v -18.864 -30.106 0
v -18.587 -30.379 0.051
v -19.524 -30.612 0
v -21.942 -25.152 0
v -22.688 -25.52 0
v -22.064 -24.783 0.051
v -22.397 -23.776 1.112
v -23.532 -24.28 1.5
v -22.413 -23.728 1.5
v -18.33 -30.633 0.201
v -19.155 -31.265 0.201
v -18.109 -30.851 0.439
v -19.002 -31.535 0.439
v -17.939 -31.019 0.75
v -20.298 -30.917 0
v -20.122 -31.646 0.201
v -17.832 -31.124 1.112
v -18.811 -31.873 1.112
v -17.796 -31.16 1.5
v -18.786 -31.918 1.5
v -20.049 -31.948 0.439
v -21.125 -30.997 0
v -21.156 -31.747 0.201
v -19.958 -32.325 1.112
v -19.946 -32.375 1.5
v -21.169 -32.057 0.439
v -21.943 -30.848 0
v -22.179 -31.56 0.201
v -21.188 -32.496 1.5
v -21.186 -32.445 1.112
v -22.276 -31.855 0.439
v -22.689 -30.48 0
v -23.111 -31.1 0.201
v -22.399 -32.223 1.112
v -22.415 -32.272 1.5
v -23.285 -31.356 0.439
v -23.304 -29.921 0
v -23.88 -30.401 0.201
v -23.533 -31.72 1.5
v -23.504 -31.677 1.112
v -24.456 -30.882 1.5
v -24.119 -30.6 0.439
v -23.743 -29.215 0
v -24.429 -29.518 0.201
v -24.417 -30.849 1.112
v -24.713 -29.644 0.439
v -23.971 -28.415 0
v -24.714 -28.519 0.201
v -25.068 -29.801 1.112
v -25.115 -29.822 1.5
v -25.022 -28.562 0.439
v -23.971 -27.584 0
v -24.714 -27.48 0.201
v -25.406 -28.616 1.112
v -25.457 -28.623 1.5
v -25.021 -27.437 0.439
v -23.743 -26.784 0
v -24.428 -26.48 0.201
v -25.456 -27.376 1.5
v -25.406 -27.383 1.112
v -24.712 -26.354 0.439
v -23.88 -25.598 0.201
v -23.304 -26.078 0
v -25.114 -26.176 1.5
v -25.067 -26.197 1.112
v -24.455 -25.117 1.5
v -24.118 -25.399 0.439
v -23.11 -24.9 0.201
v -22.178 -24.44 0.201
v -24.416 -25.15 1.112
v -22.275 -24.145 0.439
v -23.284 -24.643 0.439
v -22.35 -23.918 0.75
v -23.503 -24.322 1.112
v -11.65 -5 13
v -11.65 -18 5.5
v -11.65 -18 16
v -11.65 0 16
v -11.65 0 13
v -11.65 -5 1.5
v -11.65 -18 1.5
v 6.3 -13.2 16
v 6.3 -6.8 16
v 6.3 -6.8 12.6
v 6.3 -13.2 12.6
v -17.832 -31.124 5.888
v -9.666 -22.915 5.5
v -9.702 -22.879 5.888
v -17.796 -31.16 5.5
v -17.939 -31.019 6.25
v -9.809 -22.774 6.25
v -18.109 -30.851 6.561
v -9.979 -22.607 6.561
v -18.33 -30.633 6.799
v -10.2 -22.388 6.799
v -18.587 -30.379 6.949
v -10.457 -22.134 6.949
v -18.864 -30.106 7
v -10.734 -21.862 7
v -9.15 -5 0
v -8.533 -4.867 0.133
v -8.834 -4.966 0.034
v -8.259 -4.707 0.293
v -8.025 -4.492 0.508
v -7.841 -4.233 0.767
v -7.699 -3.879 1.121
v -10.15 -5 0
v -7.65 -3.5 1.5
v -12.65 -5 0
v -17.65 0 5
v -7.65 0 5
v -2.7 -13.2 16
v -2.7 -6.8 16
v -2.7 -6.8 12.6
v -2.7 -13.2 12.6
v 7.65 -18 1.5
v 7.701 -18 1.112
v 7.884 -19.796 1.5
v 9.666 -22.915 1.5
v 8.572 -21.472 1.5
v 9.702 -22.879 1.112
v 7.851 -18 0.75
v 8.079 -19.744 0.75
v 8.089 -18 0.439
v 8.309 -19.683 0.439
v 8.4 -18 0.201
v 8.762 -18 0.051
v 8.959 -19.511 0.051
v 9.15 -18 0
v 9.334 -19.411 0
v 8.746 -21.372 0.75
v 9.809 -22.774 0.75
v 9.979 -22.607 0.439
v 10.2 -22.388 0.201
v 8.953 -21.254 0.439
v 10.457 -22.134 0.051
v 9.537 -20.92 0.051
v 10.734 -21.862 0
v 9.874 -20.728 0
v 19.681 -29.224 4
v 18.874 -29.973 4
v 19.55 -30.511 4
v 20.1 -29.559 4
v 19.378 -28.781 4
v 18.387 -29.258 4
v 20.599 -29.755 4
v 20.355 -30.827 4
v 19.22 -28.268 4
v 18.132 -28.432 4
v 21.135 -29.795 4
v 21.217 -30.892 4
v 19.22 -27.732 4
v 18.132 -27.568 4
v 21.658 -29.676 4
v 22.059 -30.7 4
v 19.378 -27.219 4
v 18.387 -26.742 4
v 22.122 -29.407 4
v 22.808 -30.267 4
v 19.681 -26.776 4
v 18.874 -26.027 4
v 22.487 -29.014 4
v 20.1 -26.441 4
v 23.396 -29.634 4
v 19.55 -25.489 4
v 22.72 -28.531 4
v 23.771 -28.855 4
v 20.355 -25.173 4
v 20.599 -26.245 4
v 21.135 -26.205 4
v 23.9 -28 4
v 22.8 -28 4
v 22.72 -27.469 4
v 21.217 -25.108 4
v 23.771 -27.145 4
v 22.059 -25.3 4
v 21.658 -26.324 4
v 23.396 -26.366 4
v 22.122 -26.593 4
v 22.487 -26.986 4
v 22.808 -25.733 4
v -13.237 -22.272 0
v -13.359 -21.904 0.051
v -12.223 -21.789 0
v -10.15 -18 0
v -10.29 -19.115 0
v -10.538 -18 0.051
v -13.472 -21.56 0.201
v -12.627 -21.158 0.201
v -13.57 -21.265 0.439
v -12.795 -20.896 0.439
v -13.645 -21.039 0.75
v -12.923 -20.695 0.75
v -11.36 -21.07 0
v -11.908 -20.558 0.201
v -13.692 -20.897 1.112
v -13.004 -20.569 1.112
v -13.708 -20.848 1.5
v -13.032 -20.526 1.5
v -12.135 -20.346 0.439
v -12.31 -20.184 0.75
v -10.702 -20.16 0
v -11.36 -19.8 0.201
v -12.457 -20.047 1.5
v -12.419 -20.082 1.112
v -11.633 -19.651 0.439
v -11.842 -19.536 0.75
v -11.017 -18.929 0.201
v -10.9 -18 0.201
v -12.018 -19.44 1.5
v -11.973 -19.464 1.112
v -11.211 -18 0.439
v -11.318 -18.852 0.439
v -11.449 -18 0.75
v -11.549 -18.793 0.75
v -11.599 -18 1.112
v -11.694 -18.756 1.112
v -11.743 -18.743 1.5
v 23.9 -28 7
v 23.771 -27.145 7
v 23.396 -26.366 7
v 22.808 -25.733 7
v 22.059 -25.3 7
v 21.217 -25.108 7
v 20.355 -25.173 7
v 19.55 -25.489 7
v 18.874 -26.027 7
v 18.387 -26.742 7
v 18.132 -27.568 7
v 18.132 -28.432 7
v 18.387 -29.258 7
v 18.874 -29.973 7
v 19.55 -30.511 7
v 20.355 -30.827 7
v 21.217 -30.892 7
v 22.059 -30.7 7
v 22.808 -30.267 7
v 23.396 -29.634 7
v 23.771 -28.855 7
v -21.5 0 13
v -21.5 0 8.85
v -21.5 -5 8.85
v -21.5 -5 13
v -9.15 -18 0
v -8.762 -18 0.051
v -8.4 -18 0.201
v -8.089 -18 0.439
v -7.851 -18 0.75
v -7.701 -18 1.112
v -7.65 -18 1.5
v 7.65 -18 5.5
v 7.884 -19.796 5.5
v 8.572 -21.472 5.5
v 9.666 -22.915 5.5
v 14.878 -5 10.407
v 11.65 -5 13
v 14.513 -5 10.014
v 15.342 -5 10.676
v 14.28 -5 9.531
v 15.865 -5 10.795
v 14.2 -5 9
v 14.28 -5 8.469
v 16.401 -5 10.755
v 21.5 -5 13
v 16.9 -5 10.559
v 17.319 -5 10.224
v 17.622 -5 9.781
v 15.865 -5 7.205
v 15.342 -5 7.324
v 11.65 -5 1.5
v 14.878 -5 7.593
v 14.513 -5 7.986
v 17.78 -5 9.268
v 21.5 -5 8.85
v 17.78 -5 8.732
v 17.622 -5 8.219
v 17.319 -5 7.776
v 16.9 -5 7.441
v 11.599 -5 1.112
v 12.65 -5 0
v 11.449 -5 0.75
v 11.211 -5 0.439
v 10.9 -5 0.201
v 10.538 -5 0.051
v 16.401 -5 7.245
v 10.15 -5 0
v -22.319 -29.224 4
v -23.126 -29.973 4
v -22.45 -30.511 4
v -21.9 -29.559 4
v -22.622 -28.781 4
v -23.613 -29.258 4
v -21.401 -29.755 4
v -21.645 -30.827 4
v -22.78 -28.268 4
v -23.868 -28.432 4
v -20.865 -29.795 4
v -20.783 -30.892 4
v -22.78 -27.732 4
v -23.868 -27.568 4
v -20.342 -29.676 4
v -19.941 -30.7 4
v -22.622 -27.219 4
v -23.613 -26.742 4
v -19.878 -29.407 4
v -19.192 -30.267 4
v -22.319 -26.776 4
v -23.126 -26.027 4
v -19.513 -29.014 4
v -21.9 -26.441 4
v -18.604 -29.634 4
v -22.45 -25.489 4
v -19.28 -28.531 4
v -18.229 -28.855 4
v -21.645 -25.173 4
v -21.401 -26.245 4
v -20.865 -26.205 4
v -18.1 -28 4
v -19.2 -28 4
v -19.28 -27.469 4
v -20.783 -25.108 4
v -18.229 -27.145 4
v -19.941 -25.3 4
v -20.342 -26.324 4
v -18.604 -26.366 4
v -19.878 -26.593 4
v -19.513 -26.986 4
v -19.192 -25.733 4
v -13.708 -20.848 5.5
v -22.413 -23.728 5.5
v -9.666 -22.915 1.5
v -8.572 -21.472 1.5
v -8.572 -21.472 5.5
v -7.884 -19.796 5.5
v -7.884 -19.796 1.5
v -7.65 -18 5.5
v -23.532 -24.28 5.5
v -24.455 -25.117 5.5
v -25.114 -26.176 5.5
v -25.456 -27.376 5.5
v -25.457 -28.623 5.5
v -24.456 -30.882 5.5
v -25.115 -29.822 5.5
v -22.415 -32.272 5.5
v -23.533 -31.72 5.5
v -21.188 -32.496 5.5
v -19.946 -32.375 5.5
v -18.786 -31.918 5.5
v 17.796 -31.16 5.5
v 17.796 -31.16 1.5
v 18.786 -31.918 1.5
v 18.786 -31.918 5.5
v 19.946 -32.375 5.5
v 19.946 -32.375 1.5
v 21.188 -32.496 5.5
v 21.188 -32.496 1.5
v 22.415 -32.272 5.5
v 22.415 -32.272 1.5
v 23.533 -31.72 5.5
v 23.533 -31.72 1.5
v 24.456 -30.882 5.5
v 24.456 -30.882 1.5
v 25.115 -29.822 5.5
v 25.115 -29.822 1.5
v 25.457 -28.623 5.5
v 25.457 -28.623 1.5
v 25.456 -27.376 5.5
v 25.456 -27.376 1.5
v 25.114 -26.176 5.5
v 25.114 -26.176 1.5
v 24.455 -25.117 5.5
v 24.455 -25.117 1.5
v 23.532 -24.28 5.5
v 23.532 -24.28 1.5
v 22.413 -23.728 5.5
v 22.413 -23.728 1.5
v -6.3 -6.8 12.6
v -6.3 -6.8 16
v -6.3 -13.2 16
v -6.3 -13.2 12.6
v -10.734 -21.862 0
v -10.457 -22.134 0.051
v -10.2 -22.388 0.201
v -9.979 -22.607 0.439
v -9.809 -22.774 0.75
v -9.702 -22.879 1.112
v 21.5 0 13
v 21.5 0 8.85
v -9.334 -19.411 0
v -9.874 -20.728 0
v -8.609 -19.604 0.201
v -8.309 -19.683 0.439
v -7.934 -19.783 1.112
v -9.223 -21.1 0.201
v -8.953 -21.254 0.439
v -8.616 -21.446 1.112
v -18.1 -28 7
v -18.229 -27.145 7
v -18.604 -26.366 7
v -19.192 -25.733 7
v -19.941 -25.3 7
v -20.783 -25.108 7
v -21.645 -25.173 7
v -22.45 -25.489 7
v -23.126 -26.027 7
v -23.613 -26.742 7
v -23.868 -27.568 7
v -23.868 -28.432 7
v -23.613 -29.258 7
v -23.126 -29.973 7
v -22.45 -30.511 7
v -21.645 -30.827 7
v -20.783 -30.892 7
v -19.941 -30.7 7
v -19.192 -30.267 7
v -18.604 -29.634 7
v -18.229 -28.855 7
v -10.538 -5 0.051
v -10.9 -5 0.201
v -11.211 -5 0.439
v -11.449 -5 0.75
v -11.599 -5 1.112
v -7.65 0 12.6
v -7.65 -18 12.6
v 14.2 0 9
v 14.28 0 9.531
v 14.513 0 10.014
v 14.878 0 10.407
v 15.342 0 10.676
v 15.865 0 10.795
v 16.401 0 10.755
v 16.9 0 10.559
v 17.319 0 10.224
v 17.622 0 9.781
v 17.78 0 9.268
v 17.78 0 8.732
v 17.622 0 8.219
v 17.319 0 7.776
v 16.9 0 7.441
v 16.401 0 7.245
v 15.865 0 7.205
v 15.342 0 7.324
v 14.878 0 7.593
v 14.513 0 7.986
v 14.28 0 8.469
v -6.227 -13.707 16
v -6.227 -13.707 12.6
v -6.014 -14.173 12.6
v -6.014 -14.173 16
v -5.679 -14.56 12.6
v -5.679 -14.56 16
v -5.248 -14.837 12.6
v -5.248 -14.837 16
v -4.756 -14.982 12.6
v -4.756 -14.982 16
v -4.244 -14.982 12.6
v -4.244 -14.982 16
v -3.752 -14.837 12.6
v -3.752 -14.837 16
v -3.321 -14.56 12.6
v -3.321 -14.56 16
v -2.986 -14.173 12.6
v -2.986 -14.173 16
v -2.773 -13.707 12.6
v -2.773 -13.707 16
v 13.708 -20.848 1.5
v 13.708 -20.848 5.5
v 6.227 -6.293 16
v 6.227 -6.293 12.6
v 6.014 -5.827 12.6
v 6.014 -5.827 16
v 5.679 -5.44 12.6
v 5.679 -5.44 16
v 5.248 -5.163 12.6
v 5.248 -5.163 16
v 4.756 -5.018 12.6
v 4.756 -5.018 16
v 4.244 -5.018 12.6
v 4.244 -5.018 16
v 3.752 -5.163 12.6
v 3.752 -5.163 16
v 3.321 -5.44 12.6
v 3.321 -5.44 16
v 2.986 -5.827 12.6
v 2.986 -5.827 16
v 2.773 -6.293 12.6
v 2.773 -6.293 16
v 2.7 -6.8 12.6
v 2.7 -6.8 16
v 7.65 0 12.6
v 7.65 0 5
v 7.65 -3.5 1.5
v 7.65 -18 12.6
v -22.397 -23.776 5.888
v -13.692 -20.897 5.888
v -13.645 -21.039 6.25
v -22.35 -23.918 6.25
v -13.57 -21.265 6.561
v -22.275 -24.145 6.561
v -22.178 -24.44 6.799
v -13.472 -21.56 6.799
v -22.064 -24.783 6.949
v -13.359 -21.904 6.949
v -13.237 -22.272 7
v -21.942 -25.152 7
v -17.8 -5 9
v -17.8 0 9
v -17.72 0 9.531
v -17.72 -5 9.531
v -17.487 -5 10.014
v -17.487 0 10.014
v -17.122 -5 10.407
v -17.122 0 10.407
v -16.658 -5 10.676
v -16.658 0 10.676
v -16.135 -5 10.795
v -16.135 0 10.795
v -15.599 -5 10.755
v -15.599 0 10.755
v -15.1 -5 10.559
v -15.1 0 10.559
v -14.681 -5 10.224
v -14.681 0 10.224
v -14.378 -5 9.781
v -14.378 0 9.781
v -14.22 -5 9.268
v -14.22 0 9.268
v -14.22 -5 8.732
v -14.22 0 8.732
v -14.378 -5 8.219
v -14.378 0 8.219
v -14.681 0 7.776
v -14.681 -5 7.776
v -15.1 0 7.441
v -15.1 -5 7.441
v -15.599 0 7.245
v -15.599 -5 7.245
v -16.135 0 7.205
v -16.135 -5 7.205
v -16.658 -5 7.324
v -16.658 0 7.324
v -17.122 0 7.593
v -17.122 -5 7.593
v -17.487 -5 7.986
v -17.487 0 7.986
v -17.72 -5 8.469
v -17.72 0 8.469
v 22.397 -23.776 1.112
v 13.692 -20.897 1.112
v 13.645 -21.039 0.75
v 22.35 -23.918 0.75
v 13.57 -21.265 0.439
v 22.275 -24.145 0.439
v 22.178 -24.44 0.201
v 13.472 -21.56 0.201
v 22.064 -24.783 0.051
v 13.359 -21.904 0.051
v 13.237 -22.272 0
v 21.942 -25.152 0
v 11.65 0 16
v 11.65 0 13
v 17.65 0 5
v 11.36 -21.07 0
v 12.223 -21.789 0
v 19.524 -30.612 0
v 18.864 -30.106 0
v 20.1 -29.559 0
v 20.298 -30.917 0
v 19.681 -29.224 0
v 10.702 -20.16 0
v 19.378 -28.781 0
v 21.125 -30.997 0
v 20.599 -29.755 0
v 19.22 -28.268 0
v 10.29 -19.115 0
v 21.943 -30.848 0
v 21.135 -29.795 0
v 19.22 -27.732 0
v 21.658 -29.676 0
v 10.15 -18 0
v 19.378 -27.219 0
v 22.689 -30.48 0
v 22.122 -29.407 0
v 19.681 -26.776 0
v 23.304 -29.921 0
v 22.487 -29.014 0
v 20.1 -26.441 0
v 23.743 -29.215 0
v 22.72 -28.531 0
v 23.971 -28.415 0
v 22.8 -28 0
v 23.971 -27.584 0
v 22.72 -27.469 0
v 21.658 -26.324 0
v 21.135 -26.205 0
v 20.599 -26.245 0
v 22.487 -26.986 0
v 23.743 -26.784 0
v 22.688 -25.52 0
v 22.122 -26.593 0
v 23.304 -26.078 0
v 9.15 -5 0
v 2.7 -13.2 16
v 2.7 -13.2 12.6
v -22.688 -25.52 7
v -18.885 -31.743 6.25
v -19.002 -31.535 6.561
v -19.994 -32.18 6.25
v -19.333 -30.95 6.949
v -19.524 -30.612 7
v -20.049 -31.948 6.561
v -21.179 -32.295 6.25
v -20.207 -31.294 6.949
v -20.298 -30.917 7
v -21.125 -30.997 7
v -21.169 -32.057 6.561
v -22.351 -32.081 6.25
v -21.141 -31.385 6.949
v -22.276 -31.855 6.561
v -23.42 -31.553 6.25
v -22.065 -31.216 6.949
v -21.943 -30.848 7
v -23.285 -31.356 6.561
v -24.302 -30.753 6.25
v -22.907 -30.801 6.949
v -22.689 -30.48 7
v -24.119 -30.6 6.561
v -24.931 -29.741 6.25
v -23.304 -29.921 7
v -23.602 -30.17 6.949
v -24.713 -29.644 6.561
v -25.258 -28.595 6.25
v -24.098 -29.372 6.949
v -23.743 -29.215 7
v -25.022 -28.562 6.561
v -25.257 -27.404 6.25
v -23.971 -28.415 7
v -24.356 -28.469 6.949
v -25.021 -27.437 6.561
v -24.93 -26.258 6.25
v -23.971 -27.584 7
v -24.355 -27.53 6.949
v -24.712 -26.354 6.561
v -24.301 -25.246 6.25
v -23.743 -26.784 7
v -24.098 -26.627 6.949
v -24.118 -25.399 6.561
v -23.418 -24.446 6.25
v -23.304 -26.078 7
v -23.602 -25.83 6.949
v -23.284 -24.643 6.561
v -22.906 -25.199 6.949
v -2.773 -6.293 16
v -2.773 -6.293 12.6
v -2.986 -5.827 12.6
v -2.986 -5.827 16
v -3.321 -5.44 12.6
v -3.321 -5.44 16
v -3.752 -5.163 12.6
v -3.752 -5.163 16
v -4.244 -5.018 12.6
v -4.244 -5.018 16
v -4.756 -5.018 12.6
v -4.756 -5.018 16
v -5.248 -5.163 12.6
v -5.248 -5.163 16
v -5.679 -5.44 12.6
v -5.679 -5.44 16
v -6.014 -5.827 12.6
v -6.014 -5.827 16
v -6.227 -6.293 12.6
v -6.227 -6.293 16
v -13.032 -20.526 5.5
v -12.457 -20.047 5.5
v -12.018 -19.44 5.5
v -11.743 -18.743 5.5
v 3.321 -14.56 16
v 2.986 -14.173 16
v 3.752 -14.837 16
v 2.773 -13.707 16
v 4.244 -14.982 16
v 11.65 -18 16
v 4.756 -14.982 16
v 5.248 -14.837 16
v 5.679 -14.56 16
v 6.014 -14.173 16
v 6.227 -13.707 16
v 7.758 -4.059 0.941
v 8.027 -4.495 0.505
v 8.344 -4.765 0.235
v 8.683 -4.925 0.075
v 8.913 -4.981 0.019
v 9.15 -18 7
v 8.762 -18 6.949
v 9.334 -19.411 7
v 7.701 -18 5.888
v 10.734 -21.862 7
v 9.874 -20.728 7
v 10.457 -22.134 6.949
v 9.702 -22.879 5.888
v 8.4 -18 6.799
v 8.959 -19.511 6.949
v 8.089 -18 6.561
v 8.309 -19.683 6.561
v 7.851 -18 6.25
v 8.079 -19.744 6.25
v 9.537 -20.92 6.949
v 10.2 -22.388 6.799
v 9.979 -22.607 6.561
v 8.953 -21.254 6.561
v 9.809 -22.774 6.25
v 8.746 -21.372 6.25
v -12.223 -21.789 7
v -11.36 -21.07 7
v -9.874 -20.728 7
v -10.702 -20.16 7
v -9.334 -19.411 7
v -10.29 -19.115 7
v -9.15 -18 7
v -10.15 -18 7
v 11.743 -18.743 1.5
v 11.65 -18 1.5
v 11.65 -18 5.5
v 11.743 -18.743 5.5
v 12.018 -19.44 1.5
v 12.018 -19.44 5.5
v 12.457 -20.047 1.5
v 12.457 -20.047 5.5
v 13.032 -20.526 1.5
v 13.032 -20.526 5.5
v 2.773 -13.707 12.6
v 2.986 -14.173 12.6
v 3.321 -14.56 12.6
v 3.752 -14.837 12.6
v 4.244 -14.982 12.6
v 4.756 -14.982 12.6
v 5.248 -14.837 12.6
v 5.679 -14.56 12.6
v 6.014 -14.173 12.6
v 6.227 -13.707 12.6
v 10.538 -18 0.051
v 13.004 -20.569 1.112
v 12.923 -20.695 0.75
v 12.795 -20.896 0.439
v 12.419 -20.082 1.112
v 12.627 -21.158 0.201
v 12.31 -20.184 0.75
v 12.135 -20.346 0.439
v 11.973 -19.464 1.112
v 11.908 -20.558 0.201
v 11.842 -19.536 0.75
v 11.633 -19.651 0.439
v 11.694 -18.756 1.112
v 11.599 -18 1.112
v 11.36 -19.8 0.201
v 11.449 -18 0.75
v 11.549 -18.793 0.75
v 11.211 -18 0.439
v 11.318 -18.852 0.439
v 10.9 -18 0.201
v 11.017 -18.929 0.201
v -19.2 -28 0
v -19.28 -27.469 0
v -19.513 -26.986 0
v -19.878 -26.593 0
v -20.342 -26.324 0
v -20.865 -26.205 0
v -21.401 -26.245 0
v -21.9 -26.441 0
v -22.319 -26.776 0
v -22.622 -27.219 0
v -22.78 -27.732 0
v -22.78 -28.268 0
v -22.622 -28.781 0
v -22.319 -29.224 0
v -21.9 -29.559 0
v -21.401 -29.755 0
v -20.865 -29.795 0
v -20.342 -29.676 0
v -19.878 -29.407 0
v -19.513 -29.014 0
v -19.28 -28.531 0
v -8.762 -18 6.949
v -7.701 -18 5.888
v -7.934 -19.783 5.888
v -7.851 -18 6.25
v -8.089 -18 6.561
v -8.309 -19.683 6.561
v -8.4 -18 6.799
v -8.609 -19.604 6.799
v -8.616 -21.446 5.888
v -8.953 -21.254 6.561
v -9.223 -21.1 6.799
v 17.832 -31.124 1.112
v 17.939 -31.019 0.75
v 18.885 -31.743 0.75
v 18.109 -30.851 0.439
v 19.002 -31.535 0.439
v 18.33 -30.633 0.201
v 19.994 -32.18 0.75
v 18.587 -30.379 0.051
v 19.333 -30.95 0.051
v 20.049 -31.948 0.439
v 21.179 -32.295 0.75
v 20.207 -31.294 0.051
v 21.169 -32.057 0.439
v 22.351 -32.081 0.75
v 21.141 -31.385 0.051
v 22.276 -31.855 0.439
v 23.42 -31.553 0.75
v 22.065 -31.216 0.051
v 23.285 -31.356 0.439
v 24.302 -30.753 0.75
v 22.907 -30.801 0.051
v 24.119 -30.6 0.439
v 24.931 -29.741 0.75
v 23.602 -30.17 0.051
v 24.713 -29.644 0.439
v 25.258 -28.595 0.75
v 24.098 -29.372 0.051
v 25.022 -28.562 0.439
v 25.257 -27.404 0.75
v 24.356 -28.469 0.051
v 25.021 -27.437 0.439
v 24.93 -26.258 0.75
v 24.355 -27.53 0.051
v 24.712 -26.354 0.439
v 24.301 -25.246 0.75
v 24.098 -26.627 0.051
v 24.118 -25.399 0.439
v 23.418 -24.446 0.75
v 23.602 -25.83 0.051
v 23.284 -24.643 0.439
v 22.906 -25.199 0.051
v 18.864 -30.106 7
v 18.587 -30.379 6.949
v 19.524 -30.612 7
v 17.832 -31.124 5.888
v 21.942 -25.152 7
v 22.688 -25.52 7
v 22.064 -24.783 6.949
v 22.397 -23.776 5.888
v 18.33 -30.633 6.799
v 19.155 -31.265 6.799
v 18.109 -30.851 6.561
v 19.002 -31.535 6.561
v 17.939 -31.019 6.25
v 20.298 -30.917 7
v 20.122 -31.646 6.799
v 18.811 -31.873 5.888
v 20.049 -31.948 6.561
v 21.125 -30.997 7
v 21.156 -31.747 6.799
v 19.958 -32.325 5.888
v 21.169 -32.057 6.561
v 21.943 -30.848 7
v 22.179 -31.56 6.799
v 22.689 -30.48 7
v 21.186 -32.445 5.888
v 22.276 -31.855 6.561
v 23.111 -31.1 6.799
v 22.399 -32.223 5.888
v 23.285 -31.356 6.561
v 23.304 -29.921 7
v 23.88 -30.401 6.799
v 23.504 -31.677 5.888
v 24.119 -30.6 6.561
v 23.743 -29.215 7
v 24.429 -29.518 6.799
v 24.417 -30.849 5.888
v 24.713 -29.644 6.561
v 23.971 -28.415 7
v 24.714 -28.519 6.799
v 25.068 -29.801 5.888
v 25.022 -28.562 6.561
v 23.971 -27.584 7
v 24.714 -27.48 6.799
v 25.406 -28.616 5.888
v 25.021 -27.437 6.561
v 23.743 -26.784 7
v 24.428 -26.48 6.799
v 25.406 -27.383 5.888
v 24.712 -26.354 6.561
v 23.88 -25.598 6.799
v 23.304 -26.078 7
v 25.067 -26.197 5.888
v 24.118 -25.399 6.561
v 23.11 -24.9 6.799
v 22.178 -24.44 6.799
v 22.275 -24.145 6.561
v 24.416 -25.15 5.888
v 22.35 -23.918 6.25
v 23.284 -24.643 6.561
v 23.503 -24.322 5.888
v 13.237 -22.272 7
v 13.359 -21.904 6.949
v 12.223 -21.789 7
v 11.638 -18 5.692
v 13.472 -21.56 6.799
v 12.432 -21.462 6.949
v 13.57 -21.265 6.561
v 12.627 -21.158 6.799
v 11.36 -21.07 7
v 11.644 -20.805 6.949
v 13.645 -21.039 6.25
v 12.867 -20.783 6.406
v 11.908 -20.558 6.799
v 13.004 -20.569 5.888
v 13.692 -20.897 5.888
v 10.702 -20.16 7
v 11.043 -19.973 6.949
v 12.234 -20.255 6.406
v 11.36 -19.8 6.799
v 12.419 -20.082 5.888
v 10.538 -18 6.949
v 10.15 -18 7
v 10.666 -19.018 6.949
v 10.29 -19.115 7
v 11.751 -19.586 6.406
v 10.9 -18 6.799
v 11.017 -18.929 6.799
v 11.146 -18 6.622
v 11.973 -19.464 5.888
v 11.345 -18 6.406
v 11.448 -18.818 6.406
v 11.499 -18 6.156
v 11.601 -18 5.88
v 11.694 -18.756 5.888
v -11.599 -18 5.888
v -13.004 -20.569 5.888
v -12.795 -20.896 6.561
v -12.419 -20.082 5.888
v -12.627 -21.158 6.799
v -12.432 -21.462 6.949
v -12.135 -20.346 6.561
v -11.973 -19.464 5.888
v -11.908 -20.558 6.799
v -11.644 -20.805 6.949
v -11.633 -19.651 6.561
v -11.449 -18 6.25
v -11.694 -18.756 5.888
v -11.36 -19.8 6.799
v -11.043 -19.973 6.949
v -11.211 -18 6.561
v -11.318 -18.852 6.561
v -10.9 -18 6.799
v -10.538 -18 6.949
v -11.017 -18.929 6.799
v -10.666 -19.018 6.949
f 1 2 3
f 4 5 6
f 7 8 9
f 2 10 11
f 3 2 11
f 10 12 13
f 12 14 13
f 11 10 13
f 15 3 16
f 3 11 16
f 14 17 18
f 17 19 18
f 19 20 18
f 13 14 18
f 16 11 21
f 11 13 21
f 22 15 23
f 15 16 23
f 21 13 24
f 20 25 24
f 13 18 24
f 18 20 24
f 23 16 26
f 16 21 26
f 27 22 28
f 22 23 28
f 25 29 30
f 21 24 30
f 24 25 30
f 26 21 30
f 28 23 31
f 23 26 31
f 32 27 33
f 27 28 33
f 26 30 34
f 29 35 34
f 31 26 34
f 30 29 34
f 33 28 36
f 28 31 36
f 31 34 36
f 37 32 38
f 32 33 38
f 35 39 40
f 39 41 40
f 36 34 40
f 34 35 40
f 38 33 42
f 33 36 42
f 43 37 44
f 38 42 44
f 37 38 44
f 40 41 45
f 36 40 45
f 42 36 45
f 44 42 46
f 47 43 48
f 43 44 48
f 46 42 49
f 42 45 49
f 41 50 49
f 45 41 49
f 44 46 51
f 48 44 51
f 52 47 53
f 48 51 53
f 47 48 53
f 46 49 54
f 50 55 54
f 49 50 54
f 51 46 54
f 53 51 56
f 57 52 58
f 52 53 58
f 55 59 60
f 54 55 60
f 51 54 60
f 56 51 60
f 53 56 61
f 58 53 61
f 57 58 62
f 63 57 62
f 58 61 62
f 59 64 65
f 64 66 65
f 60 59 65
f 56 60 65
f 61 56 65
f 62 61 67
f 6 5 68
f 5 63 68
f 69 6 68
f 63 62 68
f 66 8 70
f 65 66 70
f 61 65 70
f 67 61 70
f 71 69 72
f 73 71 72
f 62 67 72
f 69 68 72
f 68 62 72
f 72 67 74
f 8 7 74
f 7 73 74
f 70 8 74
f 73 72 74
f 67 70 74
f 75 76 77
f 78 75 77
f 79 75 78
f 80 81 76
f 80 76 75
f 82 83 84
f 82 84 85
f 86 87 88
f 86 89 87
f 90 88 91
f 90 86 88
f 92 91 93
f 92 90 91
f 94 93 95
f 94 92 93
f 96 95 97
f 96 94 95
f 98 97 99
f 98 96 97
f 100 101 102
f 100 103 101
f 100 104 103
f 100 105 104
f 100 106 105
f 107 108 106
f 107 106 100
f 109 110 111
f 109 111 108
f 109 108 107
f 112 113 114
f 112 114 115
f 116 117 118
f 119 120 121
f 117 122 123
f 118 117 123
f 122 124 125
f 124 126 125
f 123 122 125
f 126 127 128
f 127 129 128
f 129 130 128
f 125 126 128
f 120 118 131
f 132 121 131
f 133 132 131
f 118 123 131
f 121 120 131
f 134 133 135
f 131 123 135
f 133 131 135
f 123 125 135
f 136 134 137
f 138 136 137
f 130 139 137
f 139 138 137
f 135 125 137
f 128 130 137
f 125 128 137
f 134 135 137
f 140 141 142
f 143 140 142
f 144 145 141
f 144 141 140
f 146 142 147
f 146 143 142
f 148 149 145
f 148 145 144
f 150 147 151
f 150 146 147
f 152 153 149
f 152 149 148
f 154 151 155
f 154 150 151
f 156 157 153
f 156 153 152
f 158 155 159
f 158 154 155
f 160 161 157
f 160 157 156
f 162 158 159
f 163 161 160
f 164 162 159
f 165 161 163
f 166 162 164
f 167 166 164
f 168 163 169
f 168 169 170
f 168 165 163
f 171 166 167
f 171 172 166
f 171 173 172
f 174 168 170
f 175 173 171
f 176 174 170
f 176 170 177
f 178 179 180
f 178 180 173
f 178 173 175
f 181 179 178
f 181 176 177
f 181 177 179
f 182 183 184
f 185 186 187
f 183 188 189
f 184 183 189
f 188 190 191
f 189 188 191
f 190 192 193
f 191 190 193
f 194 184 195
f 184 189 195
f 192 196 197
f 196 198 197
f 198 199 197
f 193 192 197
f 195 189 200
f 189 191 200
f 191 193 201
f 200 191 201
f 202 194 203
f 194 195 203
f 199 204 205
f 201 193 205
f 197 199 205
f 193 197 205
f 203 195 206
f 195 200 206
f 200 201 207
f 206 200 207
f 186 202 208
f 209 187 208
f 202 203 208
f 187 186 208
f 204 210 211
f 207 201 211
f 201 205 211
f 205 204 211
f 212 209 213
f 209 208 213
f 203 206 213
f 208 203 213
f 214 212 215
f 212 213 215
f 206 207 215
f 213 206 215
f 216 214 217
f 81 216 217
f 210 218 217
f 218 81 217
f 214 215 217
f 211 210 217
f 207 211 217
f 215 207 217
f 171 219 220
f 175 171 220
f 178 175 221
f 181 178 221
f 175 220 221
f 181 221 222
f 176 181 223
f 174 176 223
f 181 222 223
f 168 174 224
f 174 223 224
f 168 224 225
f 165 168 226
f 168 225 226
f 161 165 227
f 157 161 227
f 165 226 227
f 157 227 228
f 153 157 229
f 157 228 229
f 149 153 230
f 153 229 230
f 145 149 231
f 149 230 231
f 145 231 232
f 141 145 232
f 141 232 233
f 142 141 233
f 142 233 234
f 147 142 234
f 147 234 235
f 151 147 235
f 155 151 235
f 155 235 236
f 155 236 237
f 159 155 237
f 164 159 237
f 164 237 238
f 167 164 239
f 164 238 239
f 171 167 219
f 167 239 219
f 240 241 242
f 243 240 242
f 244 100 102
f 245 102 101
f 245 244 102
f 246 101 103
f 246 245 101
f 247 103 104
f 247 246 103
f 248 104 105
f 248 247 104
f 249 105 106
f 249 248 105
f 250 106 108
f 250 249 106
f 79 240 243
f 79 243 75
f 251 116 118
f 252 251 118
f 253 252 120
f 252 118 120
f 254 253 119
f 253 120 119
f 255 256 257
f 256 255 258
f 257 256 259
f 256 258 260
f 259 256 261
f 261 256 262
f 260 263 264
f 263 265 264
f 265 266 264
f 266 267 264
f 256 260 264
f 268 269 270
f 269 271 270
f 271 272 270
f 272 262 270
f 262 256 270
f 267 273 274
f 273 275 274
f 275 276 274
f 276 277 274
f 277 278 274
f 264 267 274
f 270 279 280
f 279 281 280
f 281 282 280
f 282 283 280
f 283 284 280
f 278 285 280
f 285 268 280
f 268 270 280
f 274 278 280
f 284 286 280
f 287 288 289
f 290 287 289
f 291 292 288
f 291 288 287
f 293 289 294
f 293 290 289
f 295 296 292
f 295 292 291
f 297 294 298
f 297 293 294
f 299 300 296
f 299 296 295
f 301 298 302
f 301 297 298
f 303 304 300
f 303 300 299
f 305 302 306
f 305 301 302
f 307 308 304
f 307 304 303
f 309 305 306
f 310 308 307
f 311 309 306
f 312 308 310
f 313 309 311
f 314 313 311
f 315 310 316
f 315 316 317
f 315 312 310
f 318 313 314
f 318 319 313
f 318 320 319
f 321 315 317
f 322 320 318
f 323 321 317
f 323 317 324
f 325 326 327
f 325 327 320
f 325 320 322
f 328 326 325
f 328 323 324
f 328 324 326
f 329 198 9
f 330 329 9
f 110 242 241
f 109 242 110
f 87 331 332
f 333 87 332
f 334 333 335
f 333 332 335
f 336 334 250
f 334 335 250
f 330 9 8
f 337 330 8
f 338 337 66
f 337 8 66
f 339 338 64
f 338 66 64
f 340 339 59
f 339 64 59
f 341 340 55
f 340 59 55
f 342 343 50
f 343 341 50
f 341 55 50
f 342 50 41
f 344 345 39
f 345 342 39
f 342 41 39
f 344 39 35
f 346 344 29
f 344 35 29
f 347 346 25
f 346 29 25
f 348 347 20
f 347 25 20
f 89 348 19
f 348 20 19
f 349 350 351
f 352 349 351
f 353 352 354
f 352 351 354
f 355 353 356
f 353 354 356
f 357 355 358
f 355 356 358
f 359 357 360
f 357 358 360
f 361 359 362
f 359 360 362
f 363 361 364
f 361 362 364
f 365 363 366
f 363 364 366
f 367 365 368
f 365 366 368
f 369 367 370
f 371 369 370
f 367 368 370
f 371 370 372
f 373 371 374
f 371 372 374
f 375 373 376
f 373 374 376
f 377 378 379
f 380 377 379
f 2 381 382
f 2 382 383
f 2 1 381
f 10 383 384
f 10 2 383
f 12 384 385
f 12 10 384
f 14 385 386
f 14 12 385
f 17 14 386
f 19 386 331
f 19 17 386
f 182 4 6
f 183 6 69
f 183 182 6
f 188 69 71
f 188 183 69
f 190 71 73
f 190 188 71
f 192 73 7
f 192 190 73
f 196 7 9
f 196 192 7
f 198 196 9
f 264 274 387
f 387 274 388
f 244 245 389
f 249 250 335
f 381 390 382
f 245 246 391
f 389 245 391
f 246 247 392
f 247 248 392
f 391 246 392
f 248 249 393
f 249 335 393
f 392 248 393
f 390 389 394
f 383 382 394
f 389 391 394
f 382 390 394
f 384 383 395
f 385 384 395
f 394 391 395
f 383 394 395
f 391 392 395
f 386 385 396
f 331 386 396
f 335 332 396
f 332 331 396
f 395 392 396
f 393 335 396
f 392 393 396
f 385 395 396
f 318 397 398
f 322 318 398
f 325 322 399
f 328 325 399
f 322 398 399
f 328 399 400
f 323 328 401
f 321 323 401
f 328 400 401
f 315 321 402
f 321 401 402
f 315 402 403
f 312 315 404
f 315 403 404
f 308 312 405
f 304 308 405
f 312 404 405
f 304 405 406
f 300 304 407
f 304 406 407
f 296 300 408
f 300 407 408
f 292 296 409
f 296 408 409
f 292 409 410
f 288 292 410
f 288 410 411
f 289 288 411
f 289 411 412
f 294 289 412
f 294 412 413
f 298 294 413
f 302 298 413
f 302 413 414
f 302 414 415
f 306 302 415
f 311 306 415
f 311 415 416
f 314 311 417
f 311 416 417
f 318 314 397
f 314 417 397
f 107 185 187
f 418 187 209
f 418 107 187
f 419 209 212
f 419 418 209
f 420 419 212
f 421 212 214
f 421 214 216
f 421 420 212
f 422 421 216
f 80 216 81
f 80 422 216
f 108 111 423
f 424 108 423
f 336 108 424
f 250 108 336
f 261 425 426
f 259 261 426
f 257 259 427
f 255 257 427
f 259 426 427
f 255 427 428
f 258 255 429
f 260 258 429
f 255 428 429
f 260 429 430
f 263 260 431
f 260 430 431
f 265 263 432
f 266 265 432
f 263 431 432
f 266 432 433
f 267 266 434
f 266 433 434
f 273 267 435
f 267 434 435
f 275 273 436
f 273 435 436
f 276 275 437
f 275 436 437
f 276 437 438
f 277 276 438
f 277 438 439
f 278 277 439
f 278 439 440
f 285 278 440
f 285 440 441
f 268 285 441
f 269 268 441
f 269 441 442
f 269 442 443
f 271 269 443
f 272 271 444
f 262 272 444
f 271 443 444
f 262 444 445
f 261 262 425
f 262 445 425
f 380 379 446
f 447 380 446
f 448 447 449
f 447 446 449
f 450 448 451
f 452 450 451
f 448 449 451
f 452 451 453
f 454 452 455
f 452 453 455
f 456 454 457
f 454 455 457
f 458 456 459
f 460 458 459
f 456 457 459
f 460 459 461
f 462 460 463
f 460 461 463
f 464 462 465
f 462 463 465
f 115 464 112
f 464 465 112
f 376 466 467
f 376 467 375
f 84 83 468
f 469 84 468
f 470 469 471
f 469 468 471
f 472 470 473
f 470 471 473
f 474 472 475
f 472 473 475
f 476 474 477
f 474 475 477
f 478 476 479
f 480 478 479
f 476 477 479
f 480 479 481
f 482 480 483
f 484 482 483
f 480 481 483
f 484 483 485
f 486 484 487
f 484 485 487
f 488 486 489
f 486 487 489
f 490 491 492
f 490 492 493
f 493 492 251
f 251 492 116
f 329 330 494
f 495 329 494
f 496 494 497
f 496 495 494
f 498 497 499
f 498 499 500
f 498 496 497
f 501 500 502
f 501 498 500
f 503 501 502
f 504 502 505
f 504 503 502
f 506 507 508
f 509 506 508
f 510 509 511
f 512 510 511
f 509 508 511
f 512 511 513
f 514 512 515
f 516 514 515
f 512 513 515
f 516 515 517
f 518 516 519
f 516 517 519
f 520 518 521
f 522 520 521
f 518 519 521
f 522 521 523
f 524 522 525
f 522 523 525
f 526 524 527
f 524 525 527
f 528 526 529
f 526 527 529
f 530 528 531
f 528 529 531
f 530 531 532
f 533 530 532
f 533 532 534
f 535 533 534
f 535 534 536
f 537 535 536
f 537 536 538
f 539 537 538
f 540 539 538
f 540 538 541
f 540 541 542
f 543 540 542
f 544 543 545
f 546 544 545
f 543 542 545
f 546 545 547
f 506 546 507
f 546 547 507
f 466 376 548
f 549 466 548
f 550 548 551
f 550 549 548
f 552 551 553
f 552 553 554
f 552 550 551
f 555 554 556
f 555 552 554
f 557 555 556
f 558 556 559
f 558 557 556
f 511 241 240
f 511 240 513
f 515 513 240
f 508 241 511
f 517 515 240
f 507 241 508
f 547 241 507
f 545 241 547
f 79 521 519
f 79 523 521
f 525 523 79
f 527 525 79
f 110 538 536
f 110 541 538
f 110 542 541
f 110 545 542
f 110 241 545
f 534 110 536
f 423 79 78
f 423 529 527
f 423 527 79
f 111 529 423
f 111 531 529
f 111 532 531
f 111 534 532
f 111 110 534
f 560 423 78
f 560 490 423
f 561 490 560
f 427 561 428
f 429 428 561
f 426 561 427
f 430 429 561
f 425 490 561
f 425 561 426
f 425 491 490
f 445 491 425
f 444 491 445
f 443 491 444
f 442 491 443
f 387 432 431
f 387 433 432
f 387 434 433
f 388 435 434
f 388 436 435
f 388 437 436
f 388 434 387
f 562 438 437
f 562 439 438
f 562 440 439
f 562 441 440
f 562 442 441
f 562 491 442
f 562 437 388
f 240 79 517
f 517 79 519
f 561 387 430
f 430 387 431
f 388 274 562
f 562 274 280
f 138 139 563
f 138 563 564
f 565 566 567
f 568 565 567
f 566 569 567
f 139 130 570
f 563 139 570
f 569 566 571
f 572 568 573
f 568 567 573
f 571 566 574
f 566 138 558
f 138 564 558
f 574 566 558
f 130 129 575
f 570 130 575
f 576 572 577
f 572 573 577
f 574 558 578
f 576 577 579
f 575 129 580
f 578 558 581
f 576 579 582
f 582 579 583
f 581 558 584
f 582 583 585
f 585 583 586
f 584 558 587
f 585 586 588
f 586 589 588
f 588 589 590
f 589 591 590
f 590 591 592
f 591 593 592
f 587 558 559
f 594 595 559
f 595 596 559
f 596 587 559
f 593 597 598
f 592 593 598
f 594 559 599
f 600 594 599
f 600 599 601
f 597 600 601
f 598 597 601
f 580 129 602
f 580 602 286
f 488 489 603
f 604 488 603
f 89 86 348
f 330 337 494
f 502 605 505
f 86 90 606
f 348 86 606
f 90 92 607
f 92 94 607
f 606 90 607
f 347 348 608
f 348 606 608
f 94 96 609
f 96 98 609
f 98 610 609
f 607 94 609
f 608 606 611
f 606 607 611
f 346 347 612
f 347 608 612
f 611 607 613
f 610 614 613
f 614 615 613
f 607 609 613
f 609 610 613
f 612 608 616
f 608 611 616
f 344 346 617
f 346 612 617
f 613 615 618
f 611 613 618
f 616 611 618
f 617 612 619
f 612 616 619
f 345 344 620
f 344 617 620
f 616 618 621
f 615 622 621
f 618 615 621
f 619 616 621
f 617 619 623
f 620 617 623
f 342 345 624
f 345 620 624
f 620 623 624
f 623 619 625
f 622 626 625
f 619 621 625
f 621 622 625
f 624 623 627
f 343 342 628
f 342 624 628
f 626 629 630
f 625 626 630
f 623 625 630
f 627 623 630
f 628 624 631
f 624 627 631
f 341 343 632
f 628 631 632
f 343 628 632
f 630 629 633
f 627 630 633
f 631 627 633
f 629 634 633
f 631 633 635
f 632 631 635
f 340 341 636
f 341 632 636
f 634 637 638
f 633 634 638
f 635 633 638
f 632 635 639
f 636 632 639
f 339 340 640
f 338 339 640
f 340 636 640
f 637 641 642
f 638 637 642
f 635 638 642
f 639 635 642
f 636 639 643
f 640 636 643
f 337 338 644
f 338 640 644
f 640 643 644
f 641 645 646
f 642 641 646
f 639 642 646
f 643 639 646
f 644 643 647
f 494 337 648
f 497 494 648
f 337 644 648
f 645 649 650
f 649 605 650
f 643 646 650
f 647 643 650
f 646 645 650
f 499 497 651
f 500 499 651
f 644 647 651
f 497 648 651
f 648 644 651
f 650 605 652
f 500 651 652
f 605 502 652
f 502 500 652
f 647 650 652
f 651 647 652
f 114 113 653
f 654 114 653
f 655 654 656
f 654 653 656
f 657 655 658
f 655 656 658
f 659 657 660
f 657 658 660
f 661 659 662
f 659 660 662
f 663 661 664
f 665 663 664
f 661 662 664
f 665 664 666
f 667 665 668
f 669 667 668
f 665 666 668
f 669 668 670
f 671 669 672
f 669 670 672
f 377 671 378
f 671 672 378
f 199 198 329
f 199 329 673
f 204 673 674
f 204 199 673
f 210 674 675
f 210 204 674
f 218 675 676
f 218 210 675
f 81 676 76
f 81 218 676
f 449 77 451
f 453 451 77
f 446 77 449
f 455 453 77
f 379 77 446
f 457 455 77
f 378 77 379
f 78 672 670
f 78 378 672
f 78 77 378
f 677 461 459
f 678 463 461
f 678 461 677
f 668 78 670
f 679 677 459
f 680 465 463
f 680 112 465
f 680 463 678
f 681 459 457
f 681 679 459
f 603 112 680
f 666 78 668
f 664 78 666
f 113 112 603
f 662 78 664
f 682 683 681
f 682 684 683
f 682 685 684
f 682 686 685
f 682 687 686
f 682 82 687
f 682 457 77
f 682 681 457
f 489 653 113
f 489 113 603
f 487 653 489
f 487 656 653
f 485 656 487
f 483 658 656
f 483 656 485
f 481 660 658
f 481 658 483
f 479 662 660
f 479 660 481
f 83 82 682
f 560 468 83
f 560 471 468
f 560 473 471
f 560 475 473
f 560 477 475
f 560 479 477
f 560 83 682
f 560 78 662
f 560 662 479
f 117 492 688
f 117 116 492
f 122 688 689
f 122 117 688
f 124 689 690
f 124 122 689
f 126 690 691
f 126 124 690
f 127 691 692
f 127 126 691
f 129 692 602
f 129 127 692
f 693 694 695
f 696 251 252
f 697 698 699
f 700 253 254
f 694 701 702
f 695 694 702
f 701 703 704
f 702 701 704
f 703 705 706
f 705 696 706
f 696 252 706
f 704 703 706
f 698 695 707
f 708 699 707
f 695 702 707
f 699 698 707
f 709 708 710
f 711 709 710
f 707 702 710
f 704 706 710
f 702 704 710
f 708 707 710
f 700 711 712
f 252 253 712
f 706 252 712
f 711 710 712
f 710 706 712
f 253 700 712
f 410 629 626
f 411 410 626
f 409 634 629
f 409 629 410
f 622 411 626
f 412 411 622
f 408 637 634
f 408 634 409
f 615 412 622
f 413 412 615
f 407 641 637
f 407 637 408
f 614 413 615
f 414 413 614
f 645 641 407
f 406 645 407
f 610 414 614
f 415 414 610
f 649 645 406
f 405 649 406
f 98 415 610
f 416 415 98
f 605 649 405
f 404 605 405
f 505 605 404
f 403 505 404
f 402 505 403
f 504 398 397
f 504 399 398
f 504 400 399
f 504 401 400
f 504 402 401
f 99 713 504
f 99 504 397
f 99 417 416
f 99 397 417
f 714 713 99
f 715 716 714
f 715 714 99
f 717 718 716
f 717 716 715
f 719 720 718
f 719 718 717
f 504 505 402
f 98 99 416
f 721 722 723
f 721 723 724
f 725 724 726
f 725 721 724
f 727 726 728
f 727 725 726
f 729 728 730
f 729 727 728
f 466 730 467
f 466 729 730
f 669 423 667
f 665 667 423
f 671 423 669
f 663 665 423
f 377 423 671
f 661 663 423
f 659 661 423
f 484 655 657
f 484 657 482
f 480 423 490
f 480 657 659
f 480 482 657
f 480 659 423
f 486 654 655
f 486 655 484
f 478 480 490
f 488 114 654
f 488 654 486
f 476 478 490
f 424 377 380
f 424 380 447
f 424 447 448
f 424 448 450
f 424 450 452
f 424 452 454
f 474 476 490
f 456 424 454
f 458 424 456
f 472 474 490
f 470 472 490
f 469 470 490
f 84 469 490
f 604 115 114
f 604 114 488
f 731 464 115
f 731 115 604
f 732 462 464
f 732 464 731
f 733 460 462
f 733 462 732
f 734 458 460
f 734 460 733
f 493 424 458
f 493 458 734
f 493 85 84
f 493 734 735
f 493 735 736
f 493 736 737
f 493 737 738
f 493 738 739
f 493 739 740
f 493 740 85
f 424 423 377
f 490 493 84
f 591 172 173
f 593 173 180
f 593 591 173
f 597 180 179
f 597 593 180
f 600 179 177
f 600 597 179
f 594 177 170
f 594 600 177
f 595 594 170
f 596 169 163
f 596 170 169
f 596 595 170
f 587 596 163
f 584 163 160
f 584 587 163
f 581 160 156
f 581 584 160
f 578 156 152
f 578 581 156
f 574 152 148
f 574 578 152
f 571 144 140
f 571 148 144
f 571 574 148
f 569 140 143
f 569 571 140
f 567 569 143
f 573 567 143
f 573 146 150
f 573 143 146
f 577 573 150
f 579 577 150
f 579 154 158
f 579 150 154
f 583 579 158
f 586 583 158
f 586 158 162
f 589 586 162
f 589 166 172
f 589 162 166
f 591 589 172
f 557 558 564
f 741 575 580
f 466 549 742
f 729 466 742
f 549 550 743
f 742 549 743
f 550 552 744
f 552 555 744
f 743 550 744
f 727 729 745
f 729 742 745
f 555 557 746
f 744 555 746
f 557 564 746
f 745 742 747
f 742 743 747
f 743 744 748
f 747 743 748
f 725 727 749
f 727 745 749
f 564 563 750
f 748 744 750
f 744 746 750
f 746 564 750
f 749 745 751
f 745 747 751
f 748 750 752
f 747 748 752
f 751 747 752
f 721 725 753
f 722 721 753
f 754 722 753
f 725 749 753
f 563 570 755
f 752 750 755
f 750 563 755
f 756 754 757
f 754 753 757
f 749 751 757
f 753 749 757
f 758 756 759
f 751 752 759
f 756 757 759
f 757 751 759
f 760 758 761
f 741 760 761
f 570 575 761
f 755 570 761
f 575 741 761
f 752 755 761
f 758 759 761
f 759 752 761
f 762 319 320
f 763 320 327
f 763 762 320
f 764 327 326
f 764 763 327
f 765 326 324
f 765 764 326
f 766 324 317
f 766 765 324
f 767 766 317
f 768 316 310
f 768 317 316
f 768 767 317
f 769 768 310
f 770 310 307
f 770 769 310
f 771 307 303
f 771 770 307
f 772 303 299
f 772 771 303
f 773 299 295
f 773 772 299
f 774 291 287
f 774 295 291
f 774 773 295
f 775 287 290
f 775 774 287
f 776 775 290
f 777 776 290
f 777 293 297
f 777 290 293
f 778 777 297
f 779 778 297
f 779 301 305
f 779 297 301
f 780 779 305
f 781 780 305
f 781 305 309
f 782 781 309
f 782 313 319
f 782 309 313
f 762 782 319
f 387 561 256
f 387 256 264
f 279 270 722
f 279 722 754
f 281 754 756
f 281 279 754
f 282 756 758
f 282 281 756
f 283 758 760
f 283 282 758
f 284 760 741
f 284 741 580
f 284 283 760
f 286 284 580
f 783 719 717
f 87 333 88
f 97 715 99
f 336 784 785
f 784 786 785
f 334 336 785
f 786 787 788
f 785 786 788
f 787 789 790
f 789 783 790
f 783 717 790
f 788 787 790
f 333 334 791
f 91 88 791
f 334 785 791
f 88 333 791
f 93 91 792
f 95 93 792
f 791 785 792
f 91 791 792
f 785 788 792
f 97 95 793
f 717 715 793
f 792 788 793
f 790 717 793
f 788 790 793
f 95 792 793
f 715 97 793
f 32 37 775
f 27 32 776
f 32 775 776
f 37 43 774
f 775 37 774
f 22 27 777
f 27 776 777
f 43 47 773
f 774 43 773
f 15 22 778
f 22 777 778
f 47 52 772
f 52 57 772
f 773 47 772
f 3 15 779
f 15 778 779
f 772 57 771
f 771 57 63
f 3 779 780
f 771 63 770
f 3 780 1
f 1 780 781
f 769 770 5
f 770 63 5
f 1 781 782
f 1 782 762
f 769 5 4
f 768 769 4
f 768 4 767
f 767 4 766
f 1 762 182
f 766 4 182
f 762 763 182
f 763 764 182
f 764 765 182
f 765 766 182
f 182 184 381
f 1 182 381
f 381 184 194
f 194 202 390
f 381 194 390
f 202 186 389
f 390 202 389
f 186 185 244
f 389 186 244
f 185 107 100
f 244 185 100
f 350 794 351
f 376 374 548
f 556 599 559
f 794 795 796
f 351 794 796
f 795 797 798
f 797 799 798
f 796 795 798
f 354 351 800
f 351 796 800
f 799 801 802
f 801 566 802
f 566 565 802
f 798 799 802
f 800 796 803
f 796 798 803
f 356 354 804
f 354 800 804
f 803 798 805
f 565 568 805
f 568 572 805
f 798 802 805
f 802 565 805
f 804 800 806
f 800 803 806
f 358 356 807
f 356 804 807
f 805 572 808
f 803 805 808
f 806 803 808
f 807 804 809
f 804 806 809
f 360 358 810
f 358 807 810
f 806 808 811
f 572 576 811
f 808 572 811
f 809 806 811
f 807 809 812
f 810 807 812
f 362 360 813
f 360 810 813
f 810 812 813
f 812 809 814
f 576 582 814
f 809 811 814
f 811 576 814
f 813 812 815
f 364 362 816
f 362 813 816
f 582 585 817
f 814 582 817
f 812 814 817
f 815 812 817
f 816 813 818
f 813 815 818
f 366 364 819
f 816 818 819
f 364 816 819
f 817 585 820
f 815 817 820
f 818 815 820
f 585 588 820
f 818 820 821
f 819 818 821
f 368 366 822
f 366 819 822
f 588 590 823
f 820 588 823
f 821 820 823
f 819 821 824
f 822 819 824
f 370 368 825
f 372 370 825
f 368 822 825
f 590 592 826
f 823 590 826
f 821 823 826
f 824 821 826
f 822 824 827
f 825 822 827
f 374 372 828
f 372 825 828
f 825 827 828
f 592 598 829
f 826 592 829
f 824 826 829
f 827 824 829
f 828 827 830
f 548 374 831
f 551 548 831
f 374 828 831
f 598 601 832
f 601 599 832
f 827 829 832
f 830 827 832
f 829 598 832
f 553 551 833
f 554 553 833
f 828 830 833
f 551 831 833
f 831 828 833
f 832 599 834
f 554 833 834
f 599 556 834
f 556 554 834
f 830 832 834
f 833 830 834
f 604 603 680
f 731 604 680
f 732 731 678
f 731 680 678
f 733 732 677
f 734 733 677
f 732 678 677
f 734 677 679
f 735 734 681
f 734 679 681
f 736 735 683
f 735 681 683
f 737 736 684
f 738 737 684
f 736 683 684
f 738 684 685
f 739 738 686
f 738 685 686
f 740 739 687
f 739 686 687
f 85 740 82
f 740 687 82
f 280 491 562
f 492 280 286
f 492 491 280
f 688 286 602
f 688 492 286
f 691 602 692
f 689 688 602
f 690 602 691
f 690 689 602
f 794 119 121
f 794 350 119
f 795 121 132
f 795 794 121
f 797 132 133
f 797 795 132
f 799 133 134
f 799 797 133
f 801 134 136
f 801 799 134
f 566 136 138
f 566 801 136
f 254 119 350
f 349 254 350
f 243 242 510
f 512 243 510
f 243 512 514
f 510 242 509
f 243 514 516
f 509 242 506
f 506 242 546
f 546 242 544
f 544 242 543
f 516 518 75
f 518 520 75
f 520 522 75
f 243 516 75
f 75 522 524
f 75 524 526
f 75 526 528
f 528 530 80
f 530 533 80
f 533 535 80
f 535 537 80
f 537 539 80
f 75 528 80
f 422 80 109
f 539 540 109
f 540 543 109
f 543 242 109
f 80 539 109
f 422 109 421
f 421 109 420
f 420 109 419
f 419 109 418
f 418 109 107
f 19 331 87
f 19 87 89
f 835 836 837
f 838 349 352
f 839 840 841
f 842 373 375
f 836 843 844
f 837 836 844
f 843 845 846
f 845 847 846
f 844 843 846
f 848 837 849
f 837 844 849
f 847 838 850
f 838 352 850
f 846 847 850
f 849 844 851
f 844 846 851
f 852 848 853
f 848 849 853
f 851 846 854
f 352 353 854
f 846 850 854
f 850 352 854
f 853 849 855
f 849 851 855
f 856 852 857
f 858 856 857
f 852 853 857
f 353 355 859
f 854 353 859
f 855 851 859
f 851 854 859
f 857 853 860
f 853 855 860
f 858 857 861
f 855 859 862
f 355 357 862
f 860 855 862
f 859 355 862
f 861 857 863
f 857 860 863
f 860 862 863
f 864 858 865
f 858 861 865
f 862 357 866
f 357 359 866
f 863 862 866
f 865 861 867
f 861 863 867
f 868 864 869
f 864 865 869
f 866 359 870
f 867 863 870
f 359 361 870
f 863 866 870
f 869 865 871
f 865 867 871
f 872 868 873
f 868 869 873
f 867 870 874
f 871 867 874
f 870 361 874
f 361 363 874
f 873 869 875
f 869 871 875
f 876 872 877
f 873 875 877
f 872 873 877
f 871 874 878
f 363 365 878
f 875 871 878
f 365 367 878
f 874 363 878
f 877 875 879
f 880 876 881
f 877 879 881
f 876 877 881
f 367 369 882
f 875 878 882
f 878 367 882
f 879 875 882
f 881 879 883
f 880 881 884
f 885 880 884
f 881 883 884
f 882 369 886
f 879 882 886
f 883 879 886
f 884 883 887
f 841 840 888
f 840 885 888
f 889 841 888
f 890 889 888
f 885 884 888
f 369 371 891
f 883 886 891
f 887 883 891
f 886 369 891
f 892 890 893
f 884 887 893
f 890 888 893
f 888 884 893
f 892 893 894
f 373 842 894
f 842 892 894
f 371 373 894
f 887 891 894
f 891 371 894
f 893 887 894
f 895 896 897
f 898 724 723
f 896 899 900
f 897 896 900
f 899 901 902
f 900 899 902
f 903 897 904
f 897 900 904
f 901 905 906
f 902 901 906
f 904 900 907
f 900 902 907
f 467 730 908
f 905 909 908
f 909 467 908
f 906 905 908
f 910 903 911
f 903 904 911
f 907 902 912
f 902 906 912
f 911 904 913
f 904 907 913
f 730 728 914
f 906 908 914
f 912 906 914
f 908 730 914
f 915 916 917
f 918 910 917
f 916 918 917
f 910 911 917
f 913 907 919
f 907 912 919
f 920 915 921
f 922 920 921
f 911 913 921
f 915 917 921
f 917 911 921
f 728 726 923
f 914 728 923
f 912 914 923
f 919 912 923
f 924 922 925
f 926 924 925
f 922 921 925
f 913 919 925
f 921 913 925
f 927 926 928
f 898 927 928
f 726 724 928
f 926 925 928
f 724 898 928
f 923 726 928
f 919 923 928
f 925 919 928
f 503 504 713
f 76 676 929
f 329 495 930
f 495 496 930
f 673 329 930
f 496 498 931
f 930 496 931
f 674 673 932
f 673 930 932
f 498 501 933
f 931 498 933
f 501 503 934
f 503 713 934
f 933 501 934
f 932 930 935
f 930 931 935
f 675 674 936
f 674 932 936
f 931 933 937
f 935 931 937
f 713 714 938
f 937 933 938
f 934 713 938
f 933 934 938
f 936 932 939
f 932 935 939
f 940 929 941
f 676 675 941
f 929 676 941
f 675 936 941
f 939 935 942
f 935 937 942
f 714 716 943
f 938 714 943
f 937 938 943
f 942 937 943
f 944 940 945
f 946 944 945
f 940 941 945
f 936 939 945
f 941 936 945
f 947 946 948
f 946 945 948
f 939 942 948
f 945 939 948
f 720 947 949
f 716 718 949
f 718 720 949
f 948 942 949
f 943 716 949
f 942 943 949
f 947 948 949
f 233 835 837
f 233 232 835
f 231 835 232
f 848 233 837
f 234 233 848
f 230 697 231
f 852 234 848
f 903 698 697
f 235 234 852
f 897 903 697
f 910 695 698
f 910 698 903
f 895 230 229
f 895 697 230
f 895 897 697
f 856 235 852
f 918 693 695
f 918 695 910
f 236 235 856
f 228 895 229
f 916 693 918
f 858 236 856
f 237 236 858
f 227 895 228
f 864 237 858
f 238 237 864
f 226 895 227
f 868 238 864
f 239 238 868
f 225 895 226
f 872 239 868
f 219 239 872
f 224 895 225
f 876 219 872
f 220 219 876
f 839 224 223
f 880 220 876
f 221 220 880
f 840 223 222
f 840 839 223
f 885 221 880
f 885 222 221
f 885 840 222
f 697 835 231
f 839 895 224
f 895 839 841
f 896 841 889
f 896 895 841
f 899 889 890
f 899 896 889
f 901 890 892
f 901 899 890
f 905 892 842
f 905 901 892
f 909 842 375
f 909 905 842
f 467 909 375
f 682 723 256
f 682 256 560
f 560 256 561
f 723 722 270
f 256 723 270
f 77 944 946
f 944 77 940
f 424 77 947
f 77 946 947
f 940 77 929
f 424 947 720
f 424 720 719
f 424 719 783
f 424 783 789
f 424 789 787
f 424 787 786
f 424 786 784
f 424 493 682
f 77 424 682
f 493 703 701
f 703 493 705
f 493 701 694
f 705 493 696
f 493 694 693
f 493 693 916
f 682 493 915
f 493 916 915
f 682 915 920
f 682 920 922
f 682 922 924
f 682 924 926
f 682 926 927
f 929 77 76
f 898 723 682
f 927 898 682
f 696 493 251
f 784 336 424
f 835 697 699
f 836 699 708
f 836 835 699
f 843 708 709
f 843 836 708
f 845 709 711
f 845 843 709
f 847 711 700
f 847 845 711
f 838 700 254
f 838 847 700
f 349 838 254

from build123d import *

# Parameters (mm, degrees)
SKETCH_R        = 1.8
PAD_DEPTH       = 7
SKETCH001_R     = 2.9
POCKET_DEPTH    = 3
SKETCH002_W     = 9.85
SKETCH002_H     = 5
PAD001_DEPTH    = 6
SKETCH005_R     = 1.8
POCKET002_DEPTH = 5
SKETCH003_W     = 23.3
SKETCH003_H     = 18
PAD002_DEPTH    = 9
SKETCH004_W     = 15.3
SKETCH004_H     = 18
POCKET001_DEPTH = 12.6
POCKET003_DEPTH = 47.001
POCKET004_DEPTH = 5
POCKET005_DEPTH = 16.001
FILLET_R        = 1.5


with BuildPart() as part:
    # Sketch → Pad (new body)
    with BuildSketch(Plane.XY):
        with BuildLine():
            Line((-21.5, 0), (-21.5, -5))
            Line((-21.5, -5), (-11.65, -5))
            Line((-11.65, -5), (-11.65, -18))
            ThreePointArc((-13.707898, -20.848235), (-12.218302, -19.756942), (-11.65, -18))
            Line((-13.707898, -20.848235), (-22.413154, -23.727647))
            ThreePointArc((-22.413154, -23.727647), (-24.822377, -30.374749), (-17.795838, -31.159643))
            Line((-9.665748, -22.915), (-17.795838, -31.159643))
            ThreePointArc((-9.665748, -22.915), (-8.173513, -20.656147), (-7.65, -18))
            Line((-7.65, -18), (7.65, -18))
            ThreePointArc((7.65, -18), (8.173513, -20.656147), (9.665748, -22.915))
            Line((9.665748, -22.915), (17.795838, -31.159643))
            ThreePointArc((17.795838, -31.159643), (24.822377, -30.374749), (22.413154, -23.727647))
            Line((13.707898, -20.848235), (22.413154, -23.727647))
            ThreePointArc((11.65, -18), (12.218302, -19.756942), (13.707898, -20.848235))
            Line((11.65, -5), (11.65, -18))
            Line((21.5, -5), (11.65, -5))
            Line((21.5, -5), (21.5, 0))
            Line((21.5, 0), (-21.5, 0))
        make_face()
        with Locations((-21, -28)):
            Circle(SKETCH_R, mode=Mode.SUBTRACT)
        with Locations((21, -28)):
            Circle(SKETCH_R, mode=Mode.SUBTRACT)
    extrude(amount=PAD_DEPTH)

    # Sketch001 (on Face22 of Pad) → Pocket (cut)
    with BuildSketch(Plane.XY.offset(7)):
        with Locations((-21, -28)):
            Circle(SKETCH001_R)
        with Locations((21, -28)):
            Circle(SKETCH001_R)
    extrude(amount=-POCKET_DEPTH, mode=Mode.SUBTRACT)

    # Sketch002 (on Face5 of Pocket) → Pad001 (join)
    with BuildSketch(Plane.XY.offset(7)):
        with Locations((16.575, -2.5)):
            Rectangle(SKETCH002_W, SKETCH002_H)
        with Locations((-16.575, -2.5)):
            Rectangle(SKETCH002_W, SKETCH002_H)
    extrude(amount=PAD001_DEPTH)

    # Sketch005 (on Face29 of Pad001) → Pocket002 (cut)
    with BuildSketch(Plane(origin=(0, 0, 0), x_dir=(-1, 0, 0), z_dir=(0, 1, 0))):
        with Locations((-16, 9)):
            Circle(SKETCH005_R)
        with Locations((16, 9)):
            Circle(SKETCH005_R)
    extrude(amount=-POCKET002_DEPTH, mode=Mode.SUBTRACT)

    # Sketch003 (on Face3 of Pad001) → Pad002 (join)
    with BuildSketch(Plane.XY.offset(7)):
        with Locations((0, -9)):
            Rectangle(SKETCH003_W, SKETCH003_H)
    extrude(amount=PAD002_DEPTH)

    # Sketch004 (on Face1 of Pad002) → Pocket001 (cut)
    with BuildSketch(Plane(origin=(0, 0, 0), x_dir=(1, 0, 0), z_dir=(0, 0, -1))):
        with Locations((0, 9)):
            Rectangle(SKETCH004_W, SKETCH004_H)
    extrude(amount=-POCKET001_DEPTH, mode=Mode.SUBTRACT)

    # Sketch006 (on Face21 of Pocket001) → Pocket003 (cut, through all)
    with BuildSketch(Plane(origin=(-21.5, 0, 0), x_dir=(0, -1, 0), z_dir=(-1, 0, 0))):
        Polygon((5, 0), (0, 0), (0, 5), align=None)
    extrude(amount=-POCKET003_DEPTH, mode=Mode.SUBTRACT)

    # Sketch007 (on Face1 of Pocket003) → Pocket004 (cut)
    with BuildSketch(Plane.XZ.offset(5)):
        Polygon((-21.5, 0), (-21.5, 8.85), (-12.65, 0), align=None)
        Polygon((21.5, 0), (21.5, 8.85), (12.65, 0), align=None)
    extrude(amount=-POCKET004_DEPTH, mode=Mode.SUBTRACT)

    # Sketch008 (on Face11 of Pocket004) → Pocket005 (cut, through all)
    with BuildSketch(Plane.XY.offset(16)):
        with BuildLine():
            ThreePointArc((-2.7, -6.8), (-4.5, -5), (-6.3, -6.8))
            Line((-6.3, -6.8), (-6.3, -13.2))
            ThreePointArc((-6.3, -13.2), (-4.5, -15), (-2.7, -13.2))
            Line((-2.7, -6.8), (-2.7, -13.2))
        make_face()
        with BuildLine():
            ThreePointArc((6.3, -6.8), (4.5, -5), (2.7, -6.8))
            Line((2.7, -6.8), (2.7, -13.2))
            ThreePointArc((2.7, -13.2), (4.5, -15), (6.3, -13.2))
            Line((6.3, -6.8), (6.3, -13.2))
        make_face()
    extrude(amount=-POCKET005_DEPTH, mode=Mode.SUBTRACT)

    # Fillet
    fillet_edges = [part.edges().sort_by_distance(p)[0] for p in [
        (-7.65, -11.5, 0),
        (7.65, -11.5, 0),
        (-13.730793, -27.037322, 7),
        (13.730793, -27.037322, 7),
    ]]
    fillet(fillet_edges, radius=FILLET_R)


solid = part.part
